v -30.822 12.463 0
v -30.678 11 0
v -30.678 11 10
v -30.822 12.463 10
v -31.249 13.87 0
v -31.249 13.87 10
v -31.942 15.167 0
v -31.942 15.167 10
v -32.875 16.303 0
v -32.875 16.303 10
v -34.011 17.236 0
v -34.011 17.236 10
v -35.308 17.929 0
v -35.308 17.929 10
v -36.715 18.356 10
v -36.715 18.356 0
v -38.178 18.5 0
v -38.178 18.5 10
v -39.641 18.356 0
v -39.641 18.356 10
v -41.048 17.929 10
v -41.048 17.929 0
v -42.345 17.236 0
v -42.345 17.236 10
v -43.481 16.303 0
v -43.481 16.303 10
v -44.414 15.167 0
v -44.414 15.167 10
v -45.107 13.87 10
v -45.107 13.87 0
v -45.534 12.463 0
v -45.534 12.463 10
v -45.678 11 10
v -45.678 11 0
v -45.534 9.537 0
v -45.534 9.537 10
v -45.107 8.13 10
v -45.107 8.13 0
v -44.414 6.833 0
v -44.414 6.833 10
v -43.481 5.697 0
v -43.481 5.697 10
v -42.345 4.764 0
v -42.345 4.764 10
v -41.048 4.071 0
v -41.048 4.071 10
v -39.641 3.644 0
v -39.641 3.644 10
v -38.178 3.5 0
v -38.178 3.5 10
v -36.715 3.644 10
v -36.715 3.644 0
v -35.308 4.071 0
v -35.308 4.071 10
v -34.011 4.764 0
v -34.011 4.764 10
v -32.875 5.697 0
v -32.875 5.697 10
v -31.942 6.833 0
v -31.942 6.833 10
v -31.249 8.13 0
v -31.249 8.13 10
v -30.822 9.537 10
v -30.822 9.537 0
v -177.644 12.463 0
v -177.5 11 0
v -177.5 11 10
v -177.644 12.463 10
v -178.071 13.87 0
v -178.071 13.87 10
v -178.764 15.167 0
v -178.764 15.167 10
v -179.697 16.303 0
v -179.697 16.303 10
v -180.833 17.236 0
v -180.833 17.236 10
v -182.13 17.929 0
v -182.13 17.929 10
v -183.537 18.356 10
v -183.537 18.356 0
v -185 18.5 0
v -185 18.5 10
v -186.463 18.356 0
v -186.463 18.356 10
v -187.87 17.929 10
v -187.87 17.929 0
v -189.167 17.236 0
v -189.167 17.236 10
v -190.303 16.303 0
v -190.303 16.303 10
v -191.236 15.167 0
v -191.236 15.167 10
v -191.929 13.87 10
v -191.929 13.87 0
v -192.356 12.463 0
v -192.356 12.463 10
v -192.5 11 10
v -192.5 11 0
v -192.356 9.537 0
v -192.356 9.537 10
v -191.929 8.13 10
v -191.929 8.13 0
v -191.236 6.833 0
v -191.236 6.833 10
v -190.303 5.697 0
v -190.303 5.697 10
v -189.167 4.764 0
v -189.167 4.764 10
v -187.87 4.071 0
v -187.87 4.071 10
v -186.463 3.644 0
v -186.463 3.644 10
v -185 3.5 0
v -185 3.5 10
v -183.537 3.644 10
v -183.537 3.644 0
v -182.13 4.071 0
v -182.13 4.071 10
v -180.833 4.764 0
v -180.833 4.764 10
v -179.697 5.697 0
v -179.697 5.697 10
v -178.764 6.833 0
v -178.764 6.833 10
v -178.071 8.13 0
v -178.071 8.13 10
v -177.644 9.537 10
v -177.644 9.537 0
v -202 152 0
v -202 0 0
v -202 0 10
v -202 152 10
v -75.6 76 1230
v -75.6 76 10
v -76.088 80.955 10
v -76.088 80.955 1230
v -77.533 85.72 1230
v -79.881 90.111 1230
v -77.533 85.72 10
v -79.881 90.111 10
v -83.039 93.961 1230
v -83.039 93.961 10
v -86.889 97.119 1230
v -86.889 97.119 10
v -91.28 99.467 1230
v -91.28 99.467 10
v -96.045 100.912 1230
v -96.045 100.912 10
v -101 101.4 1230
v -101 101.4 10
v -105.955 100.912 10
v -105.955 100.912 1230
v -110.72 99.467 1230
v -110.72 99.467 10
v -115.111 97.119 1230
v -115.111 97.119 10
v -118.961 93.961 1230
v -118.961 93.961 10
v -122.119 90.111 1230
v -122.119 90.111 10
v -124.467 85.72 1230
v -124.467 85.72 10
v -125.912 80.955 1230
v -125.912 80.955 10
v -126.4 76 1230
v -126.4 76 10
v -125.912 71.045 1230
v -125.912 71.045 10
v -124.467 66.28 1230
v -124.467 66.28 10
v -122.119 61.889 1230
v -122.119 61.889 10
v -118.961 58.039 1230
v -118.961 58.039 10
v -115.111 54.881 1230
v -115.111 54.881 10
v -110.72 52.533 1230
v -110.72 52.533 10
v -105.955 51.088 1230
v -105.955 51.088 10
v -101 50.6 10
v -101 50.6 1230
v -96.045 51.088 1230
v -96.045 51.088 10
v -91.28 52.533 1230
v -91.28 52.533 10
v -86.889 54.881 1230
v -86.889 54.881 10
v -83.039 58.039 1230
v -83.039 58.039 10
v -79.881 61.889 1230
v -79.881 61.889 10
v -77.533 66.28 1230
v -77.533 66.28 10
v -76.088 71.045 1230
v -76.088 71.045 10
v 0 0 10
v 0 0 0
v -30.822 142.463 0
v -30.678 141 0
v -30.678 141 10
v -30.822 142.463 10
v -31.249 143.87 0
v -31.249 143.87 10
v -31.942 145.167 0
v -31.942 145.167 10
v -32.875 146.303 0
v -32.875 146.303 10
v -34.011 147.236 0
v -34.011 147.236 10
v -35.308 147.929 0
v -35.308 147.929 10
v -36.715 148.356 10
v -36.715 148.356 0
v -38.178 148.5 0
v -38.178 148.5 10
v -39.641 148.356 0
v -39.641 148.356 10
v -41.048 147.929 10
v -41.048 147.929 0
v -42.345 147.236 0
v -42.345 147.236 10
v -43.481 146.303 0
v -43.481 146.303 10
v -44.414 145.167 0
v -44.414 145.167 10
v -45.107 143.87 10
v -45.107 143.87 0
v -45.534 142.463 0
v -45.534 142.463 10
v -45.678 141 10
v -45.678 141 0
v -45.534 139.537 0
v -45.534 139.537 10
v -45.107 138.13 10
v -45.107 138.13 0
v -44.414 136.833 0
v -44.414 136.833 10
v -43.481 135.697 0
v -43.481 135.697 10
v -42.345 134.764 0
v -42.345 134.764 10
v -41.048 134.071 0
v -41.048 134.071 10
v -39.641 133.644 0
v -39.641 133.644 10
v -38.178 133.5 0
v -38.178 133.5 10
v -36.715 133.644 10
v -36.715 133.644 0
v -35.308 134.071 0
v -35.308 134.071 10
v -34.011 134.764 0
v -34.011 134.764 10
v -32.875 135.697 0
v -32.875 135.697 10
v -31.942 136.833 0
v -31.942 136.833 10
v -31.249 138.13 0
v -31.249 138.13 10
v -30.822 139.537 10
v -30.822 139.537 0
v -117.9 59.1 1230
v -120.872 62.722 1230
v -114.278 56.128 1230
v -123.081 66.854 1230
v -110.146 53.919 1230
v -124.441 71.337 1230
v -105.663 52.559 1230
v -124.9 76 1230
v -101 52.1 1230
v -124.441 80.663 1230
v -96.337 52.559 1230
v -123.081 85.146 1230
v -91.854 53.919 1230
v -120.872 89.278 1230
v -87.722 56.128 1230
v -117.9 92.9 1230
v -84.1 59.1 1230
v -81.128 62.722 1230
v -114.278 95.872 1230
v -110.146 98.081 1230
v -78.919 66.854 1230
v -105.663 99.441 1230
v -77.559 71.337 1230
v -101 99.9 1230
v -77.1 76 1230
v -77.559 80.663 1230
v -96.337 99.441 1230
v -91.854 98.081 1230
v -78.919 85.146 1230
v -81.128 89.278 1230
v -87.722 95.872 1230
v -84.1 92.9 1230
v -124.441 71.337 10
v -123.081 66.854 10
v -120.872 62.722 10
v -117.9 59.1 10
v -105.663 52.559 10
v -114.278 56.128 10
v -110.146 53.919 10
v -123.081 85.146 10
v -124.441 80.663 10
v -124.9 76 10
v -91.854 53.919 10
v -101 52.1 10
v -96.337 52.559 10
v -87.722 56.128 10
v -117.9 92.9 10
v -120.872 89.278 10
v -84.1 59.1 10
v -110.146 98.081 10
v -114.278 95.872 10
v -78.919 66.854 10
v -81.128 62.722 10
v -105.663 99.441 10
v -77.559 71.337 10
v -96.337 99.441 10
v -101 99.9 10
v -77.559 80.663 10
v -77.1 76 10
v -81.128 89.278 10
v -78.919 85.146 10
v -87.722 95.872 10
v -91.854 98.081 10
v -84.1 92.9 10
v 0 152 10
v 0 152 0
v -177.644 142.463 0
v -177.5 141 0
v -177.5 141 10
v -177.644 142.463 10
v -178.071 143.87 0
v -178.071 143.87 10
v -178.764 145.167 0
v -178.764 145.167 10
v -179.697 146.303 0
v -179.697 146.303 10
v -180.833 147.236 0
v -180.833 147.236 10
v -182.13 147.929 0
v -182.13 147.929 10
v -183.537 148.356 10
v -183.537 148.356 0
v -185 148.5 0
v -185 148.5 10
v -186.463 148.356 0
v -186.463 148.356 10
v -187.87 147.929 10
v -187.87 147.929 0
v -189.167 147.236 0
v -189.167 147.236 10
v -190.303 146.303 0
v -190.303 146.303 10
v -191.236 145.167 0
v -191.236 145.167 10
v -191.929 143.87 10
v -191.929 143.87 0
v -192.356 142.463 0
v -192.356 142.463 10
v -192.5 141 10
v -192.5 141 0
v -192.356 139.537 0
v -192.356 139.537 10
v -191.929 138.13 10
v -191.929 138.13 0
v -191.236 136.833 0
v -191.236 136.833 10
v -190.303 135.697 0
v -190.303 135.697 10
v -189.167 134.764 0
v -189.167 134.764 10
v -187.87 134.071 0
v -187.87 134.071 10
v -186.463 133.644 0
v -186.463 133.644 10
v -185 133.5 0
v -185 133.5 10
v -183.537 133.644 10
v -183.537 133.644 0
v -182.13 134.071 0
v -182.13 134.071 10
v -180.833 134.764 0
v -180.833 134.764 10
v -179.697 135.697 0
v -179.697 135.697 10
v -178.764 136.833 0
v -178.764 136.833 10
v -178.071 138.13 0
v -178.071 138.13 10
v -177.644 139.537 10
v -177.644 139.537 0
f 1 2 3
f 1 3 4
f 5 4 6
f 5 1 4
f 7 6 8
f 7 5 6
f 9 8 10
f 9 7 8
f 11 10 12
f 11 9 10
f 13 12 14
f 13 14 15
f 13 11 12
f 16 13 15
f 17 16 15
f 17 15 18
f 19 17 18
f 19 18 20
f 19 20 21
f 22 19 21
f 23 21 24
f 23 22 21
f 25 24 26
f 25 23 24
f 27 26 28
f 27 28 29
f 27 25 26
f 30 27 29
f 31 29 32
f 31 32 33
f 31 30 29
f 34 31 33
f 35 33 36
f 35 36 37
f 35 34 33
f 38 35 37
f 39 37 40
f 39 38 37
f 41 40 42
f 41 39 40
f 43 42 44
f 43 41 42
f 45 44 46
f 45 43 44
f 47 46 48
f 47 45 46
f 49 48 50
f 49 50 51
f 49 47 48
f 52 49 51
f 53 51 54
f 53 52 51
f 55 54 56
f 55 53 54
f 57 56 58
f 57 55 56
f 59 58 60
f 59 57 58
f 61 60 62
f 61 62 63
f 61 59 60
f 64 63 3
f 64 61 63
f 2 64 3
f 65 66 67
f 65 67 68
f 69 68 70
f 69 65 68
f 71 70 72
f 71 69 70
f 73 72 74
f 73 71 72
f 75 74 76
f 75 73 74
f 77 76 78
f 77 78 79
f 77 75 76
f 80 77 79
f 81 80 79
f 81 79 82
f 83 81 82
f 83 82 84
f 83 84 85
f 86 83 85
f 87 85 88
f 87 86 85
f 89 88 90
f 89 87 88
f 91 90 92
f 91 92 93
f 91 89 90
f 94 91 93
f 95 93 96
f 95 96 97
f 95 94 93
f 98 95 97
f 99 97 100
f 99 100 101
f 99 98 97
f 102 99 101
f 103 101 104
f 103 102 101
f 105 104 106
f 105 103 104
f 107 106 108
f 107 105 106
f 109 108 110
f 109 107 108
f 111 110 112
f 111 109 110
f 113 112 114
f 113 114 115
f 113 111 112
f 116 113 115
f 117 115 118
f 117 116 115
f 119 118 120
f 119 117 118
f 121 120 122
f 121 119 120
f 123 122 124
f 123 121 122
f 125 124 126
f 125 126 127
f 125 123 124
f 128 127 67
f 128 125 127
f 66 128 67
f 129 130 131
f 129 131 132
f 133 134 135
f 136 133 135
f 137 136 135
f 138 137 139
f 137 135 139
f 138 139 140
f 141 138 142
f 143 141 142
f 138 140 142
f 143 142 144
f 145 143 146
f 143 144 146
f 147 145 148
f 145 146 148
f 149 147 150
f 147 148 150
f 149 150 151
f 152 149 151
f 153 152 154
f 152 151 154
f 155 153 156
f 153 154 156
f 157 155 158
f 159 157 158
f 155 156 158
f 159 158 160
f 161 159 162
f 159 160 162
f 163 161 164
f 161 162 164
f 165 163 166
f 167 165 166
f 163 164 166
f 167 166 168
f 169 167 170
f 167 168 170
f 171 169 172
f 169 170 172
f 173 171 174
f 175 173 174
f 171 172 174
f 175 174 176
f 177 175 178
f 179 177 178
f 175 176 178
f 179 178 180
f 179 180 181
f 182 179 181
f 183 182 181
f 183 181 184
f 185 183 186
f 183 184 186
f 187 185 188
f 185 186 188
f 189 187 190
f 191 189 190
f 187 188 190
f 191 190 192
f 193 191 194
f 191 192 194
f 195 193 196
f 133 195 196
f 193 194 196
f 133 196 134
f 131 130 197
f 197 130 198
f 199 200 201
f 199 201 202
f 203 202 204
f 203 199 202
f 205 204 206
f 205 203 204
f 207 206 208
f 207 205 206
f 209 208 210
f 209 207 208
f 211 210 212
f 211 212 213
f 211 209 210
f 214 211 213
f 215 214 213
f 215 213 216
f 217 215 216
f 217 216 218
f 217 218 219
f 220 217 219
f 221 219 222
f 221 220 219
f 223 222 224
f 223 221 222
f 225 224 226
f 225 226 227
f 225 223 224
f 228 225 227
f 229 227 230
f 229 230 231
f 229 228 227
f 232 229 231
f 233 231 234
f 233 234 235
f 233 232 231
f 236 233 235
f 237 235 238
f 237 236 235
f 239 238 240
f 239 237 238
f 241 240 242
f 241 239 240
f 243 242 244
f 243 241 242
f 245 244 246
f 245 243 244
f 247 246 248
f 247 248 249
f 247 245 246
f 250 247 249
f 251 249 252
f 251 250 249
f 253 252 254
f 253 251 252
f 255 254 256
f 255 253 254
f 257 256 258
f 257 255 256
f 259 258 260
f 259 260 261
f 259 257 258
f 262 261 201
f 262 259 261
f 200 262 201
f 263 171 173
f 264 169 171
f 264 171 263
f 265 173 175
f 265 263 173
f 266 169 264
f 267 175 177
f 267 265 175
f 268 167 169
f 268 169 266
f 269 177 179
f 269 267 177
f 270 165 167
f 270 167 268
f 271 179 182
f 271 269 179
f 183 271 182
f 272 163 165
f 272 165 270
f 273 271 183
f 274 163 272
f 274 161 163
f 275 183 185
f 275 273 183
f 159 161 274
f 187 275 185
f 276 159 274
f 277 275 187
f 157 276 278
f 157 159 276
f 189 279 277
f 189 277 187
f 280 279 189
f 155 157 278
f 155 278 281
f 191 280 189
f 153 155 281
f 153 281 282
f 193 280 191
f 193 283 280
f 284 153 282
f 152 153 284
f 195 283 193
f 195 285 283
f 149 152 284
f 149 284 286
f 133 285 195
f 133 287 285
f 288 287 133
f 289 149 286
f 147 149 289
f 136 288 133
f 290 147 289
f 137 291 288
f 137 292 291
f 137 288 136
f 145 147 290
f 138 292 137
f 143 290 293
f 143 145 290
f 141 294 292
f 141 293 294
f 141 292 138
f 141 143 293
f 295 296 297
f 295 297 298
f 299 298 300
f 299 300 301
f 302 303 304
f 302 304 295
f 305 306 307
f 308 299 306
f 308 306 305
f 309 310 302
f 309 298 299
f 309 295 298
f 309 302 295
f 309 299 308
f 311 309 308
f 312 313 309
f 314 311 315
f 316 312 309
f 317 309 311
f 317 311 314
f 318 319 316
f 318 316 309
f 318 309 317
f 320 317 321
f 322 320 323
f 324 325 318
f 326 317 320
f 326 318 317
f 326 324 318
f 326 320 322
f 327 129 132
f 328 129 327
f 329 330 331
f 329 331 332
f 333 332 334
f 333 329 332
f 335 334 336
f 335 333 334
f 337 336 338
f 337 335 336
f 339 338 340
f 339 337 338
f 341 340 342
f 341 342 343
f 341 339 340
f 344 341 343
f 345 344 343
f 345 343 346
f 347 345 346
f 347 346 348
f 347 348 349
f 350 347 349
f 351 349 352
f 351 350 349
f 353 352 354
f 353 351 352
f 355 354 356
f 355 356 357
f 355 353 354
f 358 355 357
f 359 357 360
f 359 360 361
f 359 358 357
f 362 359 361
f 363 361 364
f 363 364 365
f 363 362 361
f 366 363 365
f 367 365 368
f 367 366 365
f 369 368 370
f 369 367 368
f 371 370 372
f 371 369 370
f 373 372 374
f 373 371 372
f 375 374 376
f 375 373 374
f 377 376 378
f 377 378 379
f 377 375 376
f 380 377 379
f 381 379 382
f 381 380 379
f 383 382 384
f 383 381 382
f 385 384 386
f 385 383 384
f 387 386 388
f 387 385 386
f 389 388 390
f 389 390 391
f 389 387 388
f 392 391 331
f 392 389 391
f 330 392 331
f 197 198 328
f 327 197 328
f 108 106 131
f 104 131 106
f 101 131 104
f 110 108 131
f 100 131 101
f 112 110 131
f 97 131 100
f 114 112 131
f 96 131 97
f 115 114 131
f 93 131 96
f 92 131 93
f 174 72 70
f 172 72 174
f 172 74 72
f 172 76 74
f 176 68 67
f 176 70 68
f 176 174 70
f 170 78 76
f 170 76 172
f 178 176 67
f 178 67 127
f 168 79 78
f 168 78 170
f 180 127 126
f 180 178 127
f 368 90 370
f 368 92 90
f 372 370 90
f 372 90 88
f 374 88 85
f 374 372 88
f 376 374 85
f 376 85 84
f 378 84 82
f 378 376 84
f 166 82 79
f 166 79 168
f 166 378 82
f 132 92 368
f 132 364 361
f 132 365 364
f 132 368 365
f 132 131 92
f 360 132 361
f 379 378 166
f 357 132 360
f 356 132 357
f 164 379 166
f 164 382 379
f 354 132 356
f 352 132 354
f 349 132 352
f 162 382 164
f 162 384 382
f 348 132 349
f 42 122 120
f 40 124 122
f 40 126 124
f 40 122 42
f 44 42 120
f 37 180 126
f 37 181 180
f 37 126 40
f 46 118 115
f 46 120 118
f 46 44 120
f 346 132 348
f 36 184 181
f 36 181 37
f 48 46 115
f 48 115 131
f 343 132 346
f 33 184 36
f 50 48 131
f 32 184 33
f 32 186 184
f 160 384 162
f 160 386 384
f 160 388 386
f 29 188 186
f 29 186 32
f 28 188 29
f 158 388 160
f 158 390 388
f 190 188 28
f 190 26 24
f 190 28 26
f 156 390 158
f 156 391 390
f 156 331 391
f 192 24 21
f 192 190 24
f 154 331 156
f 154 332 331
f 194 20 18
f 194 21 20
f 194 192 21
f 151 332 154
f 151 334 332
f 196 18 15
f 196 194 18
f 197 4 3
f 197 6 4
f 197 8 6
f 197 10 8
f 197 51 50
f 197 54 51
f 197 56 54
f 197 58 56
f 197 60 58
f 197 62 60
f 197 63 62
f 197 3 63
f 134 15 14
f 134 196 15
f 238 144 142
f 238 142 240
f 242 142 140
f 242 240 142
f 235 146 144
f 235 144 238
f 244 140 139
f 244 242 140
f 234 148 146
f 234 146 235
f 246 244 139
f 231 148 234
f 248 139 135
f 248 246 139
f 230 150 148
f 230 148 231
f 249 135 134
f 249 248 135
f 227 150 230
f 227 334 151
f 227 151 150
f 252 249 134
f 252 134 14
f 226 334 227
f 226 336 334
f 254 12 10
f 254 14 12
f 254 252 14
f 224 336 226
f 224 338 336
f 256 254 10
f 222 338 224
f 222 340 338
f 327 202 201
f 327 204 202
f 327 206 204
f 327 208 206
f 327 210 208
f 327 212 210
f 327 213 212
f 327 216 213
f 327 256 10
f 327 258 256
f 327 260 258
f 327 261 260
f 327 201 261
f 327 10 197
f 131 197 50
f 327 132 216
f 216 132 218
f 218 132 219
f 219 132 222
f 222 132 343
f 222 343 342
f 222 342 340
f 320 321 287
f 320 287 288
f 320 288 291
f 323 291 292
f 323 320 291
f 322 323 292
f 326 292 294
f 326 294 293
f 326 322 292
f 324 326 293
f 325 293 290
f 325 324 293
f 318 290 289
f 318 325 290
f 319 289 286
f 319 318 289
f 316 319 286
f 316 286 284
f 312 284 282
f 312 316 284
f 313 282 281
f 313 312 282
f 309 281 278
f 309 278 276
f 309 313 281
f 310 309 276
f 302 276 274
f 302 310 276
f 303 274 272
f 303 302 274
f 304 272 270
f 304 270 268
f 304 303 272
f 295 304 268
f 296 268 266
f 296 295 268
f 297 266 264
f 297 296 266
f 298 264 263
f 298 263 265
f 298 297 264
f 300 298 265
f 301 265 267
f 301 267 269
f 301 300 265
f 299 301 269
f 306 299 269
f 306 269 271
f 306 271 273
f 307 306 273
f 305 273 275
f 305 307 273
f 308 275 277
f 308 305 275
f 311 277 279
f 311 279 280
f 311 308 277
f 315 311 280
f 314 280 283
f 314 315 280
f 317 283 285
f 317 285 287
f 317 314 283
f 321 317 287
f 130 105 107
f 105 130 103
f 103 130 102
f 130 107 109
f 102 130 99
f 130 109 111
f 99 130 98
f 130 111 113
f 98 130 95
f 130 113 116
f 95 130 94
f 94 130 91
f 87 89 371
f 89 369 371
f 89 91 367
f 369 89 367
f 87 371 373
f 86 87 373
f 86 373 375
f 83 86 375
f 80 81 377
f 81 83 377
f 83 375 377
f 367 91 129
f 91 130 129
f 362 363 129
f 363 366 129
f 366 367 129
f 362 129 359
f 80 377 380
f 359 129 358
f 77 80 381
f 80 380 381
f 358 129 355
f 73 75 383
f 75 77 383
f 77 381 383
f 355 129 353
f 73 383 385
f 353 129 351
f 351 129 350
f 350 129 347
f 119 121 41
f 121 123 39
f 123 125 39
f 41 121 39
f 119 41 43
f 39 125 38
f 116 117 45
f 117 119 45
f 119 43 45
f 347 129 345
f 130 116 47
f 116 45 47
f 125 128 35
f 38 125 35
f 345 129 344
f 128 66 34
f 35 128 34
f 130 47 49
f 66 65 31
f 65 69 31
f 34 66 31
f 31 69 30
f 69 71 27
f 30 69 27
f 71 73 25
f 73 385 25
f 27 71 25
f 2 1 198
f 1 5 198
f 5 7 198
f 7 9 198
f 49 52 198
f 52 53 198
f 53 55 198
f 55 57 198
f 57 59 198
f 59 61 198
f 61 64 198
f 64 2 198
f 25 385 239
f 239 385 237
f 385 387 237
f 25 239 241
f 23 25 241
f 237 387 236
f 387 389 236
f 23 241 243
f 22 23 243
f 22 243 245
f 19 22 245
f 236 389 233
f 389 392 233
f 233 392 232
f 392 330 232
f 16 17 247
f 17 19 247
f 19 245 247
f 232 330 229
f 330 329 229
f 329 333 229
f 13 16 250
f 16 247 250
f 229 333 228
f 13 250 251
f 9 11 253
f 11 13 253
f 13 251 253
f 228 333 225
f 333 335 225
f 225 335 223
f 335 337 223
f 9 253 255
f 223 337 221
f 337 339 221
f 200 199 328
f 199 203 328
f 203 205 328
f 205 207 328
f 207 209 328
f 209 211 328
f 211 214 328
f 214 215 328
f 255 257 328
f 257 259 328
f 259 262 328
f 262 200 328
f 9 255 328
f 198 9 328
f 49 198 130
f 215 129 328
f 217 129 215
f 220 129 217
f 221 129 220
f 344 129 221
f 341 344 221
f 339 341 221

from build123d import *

# Parameters (mm, degrees)
SKETCH1_W           = 202
SKETCH1_H           = 152
SKETCH1_R           = 7.5
BOSS_EXTRUDE1_DEPTH = 10
SKETCH2_R           = 25.4
SKETCH2_R_2         = 23.9
BOSS_EXTRUDE2_DEPTH = 1220


with BuildPart() as part:
    # Sketch1 → Boss-Extrude1 (new body)
    with BuildSketch(Plane.XY):
        with Locations((-101, 76)):
            Rectangle(SKETCH1_W, SKETCH1_H)
        with Locations((-185, 141)):
            Circle(SKETCH1_R, mode=Mode.SUBTRACT)
        with Locations((-185, 11)):
            Circle(SKETCH1_R, mode=Mode.SUBTRACT)
        with Locations((-38.177870513, 141)):
            Circle(SKETCH1_R, mode=Mode.SUBTRACT)
        with Locations((-38.177870513, 11)):
            Circle(SKETCH1_R, mode=Mode.SUBTRACT)
    extrude(amount=BOSS_EXTRUDE1_DEPTH)

    # Sketch2 → Boss-Extrude2 (add)
    with BuildSketch(Plane.XY.offset(10)):
        with Locations((-101, 76)):
            Circle(SKETCH2_R)
        with Locations((-101, 76)):
            Circle(SKETCH2_R_2, mode=Mode.SUBTRACT)
    extrude(amount=BOSS_EXTRUDE2_DEPTH)


solid = part.part
